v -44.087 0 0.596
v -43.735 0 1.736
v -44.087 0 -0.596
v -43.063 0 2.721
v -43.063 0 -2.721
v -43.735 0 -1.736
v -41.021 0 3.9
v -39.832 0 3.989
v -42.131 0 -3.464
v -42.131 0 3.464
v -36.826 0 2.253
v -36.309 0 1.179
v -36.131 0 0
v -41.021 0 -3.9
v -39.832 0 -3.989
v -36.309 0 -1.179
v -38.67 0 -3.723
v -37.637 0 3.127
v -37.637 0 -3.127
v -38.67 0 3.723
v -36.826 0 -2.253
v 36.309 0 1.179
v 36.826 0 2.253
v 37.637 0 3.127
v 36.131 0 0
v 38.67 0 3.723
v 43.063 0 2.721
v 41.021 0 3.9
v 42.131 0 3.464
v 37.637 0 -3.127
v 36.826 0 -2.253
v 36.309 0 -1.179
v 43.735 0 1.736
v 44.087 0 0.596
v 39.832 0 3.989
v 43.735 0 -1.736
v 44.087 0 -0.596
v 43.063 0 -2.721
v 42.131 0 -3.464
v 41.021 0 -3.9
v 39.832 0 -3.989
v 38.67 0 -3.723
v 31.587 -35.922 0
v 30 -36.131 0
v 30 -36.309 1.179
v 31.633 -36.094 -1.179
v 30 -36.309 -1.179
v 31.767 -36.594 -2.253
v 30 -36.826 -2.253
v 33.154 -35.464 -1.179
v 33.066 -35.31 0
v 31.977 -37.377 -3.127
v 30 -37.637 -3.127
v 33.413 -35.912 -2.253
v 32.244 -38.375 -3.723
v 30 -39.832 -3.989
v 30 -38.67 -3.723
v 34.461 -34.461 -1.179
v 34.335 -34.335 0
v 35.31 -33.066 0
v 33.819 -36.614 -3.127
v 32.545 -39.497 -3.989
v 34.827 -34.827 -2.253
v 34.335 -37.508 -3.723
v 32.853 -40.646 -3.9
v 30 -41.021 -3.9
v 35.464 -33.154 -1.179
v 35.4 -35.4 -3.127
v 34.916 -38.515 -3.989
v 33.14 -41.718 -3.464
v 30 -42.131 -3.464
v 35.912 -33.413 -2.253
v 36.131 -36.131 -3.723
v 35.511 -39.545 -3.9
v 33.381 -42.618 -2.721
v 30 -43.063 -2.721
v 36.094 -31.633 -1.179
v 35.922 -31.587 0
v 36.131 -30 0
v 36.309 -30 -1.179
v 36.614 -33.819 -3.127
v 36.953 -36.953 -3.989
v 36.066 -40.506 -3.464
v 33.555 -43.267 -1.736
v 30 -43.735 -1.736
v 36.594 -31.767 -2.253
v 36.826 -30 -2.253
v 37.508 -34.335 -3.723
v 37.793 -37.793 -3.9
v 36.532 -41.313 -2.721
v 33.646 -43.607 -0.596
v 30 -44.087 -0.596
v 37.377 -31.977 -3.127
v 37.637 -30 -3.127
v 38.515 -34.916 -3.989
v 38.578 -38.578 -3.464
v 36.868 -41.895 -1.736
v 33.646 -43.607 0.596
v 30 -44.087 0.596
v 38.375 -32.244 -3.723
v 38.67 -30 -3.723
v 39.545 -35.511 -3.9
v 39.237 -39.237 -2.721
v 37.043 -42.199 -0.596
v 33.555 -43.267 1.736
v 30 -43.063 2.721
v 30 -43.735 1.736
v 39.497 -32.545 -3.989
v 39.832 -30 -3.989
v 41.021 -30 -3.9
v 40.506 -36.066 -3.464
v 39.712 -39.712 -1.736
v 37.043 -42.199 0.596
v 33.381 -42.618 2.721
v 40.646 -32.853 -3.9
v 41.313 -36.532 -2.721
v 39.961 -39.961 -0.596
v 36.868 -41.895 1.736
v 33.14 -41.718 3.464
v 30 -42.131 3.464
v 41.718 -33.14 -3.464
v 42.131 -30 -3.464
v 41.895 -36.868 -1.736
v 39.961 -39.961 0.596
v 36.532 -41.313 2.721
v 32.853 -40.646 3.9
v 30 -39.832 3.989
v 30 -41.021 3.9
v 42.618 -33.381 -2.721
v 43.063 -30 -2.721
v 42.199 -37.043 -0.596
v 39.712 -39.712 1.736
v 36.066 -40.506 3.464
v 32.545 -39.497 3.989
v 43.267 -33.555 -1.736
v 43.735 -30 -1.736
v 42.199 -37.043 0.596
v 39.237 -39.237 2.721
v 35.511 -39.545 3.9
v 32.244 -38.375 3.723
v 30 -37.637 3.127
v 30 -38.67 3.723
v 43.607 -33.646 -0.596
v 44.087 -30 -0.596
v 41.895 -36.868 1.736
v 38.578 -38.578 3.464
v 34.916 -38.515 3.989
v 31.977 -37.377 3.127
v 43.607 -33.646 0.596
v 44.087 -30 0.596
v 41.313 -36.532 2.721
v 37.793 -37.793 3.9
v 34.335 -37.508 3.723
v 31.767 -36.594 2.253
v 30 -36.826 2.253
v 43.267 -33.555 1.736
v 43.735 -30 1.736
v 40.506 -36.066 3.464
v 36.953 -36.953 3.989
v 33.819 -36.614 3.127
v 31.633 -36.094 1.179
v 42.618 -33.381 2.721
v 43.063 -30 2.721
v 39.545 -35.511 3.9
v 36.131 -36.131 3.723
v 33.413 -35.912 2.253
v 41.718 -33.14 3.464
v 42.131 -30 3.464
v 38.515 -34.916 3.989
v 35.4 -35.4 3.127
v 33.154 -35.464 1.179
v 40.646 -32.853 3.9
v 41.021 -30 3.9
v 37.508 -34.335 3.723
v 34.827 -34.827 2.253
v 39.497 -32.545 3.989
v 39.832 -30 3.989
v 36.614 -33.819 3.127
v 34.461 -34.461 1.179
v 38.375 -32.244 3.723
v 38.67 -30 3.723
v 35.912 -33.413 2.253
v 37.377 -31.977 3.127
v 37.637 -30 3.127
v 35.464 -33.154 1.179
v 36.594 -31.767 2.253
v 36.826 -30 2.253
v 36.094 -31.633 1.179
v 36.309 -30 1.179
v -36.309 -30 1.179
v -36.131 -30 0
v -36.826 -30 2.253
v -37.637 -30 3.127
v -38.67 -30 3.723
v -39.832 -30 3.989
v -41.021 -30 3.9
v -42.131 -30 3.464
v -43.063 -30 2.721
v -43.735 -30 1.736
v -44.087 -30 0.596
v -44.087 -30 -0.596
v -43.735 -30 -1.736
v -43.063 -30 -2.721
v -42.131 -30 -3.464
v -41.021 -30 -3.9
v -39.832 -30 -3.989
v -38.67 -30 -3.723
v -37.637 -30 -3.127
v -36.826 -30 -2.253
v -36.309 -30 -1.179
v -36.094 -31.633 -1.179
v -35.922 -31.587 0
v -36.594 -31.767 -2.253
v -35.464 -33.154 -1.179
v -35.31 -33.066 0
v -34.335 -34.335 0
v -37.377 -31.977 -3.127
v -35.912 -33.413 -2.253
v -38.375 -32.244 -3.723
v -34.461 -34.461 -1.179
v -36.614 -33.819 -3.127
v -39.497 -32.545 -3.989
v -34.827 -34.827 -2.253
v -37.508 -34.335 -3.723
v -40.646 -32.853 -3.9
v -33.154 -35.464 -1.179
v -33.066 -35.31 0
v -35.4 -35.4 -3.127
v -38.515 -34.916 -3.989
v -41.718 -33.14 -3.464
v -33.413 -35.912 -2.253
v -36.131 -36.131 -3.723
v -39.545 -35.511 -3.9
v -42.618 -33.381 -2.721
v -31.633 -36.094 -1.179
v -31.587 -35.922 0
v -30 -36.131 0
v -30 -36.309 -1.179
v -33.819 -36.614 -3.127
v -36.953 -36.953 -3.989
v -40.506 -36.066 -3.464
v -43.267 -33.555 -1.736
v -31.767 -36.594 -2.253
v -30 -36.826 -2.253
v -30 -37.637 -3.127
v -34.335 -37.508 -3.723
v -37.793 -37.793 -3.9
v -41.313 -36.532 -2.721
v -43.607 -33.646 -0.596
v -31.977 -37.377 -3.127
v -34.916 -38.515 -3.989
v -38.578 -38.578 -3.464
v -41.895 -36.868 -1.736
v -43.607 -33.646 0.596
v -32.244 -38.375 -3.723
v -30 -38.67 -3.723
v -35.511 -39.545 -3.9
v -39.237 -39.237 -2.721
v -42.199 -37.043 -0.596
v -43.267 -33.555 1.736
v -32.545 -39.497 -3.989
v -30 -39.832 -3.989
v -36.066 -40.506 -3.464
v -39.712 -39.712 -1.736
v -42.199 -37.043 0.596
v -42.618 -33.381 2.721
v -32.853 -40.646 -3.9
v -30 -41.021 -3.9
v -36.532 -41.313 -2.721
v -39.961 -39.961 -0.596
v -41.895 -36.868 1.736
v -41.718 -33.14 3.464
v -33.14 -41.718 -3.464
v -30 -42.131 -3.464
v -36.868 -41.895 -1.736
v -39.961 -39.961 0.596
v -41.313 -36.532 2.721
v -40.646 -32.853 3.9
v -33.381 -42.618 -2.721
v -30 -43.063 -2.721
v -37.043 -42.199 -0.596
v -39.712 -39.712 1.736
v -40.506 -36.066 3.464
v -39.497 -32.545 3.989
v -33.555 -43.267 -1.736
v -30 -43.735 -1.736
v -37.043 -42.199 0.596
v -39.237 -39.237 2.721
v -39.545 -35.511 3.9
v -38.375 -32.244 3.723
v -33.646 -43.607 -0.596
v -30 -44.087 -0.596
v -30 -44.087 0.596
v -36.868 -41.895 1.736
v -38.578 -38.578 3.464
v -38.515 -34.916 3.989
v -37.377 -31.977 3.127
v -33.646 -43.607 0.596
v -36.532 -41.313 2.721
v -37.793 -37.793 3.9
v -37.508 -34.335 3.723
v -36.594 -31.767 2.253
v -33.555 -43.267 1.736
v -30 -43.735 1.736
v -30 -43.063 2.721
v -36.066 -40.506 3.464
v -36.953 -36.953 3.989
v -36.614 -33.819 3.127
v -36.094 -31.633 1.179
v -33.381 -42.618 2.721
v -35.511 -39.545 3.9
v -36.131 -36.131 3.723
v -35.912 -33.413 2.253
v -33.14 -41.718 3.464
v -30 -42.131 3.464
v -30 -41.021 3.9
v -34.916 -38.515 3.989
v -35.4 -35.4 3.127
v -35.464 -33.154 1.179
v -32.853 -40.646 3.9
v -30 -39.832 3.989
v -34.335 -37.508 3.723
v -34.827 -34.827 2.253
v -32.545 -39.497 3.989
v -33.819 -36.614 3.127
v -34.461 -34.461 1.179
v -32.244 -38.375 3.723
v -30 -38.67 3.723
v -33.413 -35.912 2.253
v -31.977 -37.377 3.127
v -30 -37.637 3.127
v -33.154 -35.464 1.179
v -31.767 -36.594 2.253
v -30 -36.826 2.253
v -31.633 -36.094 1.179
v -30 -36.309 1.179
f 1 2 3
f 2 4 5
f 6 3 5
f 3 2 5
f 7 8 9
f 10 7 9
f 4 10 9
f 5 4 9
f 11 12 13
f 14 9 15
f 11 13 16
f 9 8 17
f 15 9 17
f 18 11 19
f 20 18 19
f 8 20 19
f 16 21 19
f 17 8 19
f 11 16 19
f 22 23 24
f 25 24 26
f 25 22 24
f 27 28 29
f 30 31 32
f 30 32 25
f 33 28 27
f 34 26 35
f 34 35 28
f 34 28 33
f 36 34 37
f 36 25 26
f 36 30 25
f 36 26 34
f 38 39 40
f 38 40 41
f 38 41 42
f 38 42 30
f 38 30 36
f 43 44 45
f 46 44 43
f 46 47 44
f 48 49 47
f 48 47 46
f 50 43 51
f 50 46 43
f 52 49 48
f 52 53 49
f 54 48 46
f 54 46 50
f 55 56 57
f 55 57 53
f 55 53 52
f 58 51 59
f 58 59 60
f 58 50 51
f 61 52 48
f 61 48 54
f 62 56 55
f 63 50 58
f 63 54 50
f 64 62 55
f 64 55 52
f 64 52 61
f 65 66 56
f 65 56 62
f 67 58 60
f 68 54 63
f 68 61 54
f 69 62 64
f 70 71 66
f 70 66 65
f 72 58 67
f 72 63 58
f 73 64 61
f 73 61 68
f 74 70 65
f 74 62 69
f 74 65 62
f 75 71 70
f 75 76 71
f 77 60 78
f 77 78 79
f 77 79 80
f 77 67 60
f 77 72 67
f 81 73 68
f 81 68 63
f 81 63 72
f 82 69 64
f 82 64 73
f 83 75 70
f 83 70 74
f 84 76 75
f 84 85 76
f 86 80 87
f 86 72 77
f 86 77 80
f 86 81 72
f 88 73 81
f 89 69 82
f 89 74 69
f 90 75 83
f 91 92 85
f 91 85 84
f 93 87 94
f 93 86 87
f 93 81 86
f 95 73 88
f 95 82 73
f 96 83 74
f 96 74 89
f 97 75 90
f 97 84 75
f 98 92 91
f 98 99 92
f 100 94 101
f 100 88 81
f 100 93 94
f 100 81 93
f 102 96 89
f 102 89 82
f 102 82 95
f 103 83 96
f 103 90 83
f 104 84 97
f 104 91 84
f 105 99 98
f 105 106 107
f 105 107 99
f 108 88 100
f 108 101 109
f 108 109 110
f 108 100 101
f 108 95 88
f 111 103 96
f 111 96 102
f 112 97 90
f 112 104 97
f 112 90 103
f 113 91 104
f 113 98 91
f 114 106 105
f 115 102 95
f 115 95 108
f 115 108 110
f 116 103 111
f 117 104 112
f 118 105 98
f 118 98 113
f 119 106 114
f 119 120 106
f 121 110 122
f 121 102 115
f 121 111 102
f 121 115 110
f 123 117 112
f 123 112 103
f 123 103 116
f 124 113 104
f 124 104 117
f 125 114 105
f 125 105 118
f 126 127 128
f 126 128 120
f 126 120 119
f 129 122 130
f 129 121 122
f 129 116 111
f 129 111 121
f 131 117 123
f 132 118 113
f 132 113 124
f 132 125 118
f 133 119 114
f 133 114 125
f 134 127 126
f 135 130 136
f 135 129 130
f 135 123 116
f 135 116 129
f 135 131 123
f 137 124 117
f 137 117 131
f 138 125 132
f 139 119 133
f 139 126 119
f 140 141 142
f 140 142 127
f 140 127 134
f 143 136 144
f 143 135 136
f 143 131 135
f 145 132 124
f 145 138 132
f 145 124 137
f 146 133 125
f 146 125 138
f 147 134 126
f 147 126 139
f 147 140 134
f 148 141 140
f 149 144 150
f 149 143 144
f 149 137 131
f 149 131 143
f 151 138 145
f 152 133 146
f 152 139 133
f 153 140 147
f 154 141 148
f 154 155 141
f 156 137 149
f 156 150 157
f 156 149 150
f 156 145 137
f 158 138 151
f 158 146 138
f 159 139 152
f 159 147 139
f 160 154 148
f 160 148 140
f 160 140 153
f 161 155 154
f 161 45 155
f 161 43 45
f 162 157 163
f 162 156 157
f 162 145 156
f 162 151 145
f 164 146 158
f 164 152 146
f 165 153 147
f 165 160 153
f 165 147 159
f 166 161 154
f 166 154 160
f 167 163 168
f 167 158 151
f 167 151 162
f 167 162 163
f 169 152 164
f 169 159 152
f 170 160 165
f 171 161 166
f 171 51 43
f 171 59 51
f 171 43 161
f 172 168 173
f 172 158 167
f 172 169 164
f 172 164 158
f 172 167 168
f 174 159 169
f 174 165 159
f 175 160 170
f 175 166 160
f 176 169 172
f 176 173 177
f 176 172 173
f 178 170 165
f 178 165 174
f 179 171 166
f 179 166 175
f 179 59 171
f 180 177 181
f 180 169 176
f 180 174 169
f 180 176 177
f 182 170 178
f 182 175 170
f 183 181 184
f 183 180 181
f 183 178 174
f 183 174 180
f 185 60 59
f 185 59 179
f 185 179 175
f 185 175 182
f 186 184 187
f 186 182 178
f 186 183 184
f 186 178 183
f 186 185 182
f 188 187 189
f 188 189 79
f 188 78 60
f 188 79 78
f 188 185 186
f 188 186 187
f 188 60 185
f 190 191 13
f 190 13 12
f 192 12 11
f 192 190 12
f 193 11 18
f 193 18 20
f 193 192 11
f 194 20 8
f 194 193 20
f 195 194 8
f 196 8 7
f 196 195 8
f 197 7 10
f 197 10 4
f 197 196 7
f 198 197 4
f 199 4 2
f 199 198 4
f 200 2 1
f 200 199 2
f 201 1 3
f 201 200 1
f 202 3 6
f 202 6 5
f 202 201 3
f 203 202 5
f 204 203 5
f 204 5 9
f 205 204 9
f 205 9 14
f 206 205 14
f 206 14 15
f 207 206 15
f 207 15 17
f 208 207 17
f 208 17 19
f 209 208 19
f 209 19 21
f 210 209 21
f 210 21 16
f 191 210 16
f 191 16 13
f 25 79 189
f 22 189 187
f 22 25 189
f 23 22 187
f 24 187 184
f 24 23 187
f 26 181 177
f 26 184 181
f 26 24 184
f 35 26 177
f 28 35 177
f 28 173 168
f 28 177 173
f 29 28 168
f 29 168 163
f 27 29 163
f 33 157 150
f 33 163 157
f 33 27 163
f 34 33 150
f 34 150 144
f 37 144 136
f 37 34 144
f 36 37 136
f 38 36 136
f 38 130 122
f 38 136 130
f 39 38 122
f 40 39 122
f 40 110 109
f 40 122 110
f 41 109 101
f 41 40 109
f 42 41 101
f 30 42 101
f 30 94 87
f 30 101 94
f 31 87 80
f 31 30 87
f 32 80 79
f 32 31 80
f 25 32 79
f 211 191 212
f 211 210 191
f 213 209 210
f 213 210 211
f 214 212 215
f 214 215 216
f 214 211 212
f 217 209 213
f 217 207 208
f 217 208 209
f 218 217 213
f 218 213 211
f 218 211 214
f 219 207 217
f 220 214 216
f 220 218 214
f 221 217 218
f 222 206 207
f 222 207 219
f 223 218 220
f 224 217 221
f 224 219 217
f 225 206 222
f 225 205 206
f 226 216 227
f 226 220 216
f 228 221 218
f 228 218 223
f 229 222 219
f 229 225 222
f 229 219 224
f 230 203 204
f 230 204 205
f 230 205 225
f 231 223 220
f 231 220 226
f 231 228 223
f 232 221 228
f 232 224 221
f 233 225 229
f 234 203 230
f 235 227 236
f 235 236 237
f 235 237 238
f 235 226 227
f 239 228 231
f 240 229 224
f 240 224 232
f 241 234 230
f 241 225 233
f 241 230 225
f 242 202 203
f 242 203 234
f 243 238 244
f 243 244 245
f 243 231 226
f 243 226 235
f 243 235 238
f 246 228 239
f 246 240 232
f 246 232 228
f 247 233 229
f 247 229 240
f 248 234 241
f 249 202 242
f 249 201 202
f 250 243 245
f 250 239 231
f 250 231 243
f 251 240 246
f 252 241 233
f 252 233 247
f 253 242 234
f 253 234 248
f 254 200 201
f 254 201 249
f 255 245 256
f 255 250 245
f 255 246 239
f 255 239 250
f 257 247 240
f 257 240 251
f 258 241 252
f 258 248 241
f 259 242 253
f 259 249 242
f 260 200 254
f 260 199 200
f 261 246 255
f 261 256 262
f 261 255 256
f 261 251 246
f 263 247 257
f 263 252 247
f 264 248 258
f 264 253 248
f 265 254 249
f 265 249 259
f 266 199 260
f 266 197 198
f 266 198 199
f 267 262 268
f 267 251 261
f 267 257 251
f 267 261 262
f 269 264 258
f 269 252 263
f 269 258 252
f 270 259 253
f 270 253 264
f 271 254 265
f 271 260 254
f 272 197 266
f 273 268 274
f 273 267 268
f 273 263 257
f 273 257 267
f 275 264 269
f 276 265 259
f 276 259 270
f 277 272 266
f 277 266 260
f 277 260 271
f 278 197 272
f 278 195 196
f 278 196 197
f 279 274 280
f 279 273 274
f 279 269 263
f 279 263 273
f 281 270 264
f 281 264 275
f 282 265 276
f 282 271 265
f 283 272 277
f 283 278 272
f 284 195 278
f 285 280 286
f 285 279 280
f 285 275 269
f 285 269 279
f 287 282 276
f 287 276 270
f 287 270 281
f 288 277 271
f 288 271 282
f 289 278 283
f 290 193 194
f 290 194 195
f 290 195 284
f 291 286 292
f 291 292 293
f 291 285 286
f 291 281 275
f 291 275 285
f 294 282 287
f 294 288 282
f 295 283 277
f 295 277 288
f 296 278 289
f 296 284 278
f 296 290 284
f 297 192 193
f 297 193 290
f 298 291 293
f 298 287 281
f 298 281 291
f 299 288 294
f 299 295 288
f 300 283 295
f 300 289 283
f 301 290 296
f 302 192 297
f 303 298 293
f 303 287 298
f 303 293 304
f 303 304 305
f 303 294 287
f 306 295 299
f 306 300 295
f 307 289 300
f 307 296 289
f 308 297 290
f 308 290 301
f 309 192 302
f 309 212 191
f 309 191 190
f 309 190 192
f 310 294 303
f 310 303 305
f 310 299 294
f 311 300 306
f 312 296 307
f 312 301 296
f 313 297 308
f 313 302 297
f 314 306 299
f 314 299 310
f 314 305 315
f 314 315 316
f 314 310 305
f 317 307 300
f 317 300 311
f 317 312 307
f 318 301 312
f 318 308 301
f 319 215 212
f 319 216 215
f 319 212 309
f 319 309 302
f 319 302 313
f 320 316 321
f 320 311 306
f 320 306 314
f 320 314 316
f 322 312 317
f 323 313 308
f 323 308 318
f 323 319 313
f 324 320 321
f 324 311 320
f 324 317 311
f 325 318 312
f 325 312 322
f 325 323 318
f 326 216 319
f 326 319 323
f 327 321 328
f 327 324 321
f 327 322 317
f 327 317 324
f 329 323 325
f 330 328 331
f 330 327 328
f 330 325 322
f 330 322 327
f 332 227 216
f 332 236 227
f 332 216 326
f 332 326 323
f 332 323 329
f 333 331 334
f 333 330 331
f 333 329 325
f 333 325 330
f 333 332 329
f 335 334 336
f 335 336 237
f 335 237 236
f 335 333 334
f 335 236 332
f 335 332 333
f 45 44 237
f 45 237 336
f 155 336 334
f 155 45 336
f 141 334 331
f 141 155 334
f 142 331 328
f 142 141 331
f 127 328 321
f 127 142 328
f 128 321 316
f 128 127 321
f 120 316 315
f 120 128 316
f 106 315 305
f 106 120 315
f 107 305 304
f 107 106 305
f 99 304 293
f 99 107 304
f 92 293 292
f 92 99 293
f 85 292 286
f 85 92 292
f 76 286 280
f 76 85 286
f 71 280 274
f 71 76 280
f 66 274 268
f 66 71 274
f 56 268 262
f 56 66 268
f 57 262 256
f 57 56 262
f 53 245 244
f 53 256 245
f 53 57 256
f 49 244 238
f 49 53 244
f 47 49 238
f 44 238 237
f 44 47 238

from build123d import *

# Parameters (mm, degrees)
F1_R = 4


with BuildPart() as f2:
    # F2: sweep along a path in F0
    with BuildLine(Plane.XY) as f2_path:
        Line((-40, 0), (-40, -30))
        ThreePointArc((-40, -30), (-37.071068, -37.071068), (-30, -40))
        Line((-30, -40), (0, -40))
        Line((0, -40), (30, -40))
        ThreePointArc((30, -40), (37.071068, -37.071068), (40, -30))
        Line((40, -30), (40, 0))
    # F1 (on Front) → F2 (sweep)
    with BuildSketch(Plane.XZ):
        with Locations((-40.13129, 0)):
            Circle(F1_R)
    sweep(path=f2_path.line)


solid = f2.part
